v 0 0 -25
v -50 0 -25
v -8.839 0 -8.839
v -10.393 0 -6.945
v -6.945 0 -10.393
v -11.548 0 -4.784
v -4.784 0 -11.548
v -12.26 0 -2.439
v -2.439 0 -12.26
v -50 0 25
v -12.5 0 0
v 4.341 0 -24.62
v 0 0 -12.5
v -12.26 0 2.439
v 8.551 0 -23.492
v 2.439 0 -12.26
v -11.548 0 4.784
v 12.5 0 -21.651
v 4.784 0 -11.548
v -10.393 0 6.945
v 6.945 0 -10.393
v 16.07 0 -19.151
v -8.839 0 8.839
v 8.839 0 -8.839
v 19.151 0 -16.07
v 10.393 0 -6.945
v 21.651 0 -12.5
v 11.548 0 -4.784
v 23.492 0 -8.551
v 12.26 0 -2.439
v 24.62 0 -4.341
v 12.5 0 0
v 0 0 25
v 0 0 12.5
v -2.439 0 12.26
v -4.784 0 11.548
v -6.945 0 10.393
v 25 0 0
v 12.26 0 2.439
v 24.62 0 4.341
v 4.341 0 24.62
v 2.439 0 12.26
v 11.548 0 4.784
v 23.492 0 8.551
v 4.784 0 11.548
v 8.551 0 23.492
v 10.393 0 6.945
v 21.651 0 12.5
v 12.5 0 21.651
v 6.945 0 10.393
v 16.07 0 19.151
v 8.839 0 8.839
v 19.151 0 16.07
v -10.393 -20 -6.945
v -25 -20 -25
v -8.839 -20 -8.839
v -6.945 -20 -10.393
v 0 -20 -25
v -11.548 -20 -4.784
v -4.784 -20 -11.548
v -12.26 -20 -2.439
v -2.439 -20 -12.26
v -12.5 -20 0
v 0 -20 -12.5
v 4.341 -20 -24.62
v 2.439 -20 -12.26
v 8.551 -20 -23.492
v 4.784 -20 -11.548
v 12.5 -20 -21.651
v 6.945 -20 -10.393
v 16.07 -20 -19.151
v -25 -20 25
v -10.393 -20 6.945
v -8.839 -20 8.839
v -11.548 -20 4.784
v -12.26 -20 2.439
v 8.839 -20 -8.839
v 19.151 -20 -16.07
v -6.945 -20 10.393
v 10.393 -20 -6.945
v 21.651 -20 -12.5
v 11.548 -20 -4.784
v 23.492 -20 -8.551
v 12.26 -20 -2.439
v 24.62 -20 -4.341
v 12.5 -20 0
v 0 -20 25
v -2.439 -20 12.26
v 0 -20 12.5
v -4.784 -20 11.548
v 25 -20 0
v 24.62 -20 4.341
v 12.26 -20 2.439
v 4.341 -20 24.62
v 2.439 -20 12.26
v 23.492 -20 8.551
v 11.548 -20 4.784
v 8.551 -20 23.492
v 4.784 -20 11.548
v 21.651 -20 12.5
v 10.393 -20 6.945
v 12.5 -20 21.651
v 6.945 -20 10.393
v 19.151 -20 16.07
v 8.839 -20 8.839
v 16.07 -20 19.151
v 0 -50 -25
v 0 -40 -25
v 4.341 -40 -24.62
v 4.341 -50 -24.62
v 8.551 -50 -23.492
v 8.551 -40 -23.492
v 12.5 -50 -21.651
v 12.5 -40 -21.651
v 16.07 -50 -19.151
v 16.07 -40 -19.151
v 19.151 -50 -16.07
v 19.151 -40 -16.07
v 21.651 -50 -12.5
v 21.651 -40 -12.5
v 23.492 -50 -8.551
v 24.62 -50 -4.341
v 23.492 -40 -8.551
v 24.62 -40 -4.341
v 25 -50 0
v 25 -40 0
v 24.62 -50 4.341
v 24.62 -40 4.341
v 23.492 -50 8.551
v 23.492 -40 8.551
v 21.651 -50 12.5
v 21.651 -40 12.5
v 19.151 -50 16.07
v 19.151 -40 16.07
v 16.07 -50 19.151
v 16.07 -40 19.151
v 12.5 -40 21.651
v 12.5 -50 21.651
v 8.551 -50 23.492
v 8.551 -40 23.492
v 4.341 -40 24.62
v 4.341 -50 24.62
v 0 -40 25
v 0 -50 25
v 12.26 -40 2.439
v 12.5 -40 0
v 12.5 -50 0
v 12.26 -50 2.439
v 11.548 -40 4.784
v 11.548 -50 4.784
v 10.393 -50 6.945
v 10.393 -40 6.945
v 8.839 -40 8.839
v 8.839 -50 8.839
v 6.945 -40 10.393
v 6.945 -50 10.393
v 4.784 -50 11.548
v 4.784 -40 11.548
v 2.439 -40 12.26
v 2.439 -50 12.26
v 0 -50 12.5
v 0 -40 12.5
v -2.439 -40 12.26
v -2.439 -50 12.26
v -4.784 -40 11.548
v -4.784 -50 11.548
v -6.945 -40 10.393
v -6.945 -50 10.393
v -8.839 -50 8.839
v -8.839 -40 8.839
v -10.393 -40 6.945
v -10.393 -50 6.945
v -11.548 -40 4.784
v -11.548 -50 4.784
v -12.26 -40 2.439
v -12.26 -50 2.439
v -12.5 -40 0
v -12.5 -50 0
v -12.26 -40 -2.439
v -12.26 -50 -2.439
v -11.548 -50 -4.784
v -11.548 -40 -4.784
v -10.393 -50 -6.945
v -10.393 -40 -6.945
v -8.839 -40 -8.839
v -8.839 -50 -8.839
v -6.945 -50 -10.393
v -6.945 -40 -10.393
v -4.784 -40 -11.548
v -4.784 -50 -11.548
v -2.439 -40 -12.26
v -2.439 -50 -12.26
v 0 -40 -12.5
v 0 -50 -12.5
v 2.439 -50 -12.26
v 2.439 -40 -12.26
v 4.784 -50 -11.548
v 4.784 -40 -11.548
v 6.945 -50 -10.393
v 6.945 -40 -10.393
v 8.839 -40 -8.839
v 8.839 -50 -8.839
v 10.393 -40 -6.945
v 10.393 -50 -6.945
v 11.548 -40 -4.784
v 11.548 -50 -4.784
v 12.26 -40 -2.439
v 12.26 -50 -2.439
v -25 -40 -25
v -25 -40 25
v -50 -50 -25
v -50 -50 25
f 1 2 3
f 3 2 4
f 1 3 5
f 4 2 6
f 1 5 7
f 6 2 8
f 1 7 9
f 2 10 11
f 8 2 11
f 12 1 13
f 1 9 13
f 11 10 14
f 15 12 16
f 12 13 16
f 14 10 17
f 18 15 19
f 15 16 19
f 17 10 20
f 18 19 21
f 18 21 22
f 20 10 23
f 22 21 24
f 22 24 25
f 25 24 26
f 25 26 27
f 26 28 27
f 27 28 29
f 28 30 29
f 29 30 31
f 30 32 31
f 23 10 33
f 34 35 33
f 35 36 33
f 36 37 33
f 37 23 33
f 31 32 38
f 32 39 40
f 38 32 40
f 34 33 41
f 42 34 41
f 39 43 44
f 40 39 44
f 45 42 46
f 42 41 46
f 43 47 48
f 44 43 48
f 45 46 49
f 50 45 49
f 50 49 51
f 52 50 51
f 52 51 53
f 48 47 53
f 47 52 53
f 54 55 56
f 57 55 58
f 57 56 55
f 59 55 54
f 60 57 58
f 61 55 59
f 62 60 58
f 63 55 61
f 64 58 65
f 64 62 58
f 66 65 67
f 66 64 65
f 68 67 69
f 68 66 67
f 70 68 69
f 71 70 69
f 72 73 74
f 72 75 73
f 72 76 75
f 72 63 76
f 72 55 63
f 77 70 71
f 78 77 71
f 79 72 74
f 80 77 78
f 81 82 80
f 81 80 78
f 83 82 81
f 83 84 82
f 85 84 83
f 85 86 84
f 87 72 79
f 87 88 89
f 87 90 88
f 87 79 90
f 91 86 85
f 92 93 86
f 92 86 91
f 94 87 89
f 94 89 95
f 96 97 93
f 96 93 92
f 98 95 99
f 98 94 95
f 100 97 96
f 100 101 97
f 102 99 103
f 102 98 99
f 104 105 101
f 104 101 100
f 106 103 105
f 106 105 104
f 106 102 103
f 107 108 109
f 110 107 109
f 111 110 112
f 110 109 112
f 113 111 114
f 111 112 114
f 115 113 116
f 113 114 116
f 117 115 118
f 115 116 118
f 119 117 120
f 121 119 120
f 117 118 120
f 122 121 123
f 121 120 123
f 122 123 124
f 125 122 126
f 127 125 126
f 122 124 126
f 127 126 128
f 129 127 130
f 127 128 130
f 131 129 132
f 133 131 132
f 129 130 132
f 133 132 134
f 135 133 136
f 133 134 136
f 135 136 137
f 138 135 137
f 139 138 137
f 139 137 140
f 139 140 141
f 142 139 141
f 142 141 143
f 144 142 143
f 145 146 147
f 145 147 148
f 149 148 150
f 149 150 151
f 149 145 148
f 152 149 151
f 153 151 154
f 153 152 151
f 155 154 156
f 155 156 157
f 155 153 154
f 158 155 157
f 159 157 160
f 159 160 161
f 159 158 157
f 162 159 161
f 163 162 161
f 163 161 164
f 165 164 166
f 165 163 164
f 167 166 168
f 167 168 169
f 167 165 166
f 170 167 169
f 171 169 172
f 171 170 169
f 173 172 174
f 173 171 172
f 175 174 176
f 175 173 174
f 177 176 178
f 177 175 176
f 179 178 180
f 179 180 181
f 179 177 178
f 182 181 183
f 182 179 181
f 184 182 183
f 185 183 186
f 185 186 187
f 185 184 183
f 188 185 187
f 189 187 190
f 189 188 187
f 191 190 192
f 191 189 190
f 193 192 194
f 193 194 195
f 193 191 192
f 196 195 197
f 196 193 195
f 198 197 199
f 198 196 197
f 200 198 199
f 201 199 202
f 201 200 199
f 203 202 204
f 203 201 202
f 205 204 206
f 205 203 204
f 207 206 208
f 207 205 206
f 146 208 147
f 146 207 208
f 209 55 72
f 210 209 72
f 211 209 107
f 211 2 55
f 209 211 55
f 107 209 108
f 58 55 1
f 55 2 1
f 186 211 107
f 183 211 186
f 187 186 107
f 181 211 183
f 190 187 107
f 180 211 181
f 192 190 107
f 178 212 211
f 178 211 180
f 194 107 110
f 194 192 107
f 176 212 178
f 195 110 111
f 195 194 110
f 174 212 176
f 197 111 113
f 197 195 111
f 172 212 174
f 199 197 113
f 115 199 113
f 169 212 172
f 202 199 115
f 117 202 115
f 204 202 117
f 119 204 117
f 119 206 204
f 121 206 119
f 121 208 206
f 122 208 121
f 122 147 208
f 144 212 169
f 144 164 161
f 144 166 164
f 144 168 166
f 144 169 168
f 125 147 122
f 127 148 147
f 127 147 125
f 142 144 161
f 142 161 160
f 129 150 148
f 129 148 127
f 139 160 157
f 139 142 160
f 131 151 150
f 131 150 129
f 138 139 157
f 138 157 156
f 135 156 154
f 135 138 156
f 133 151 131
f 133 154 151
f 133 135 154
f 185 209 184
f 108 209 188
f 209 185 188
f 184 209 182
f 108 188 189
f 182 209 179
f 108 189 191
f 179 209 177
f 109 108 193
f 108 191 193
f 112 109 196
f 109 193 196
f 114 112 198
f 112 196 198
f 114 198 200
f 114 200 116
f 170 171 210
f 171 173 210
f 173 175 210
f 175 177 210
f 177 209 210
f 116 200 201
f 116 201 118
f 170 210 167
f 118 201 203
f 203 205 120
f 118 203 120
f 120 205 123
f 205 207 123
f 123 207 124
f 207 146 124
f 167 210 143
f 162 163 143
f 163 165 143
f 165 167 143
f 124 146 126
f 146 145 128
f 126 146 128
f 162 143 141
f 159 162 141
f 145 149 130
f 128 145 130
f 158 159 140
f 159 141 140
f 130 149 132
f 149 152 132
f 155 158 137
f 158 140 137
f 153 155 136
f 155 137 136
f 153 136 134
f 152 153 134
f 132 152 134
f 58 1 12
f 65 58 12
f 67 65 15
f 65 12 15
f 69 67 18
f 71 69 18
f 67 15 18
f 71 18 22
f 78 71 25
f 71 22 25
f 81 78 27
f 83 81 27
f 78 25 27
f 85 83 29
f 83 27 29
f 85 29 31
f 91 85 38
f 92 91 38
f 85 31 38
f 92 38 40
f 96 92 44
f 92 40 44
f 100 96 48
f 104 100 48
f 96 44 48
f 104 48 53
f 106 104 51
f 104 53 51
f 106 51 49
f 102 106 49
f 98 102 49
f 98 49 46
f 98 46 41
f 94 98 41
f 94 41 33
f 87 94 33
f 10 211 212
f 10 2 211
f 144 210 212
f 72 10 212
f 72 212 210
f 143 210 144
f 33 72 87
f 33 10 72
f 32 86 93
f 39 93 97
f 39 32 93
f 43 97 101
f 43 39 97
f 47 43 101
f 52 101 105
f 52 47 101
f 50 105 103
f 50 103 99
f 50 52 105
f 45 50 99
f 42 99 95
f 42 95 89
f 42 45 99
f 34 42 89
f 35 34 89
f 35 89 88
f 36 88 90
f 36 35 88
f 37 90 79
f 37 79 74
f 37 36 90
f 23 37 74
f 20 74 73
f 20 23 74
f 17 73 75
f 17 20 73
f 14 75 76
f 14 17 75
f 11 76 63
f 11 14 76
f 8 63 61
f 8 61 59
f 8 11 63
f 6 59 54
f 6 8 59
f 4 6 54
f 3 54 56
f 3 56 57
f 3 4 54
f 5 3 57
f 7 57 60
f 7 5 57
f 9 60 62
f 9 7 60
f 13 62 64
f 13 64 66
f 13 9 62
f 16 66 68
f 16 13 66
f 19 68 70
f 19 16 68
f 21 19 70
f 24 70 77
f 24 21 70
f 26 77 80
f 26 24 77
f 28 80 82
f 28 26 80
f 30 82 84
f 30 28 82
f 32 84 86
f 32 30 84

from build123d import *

# Parameters (mm, degrees)
F0_R     = 12.5
F1_DEPTH = 20
F3_R     = 12.5
F4_DEPTH = 10
F5_W     = 25
F5_H     = 50
F6_DEPTH = 20


with BuildPart() as f1:
    # F0 (on Front) → F1 (new body)
    with BuildSketch(Plane.XZ):
        with BuildLine():
            Line((-50, -25), (0, -25))
            ThreePointArc((0, -25), (25, 0), (0, 25))
            Line((0, 25), (-50, 25))
            Line((-50, 25), (-50, -25))
        make_face()
        Circle(F0_R, mode=Mode.SUBTRACT)
    extrude(amount=F1_DEPTH)



with BuildPart() as f4:
    # F3 (on offset) → F4 (new body)
    with BuildSketch(Plane.XZ.offset(40)):
        with BuildLine():
            Line((0, 25), (-50, 25))
            Line((-50, 25), (-50, -25))
            Line((-50, -25), (0, -25))
            ThreePointArc((0, -25), (25, 0), (0, 25))
        make_face()
        Circle(F3_R, mode=Mode.SUBTRACT)
    extrude(amount=F4_DEPTH)


with BuildPart() as f1_1:
    add(f1.part)

    add(f4.part)  # F6 merges F4
    # F5 (on face) → F6 (join, through all)
    with BuildSketch(Plane.XZ.offset(20)):
        with Locations((-37.5, 0)):
            Rectangle(F5_W, F5_H)
    extrude(amount=F6_DEPTH)


solid = f1_1.part
